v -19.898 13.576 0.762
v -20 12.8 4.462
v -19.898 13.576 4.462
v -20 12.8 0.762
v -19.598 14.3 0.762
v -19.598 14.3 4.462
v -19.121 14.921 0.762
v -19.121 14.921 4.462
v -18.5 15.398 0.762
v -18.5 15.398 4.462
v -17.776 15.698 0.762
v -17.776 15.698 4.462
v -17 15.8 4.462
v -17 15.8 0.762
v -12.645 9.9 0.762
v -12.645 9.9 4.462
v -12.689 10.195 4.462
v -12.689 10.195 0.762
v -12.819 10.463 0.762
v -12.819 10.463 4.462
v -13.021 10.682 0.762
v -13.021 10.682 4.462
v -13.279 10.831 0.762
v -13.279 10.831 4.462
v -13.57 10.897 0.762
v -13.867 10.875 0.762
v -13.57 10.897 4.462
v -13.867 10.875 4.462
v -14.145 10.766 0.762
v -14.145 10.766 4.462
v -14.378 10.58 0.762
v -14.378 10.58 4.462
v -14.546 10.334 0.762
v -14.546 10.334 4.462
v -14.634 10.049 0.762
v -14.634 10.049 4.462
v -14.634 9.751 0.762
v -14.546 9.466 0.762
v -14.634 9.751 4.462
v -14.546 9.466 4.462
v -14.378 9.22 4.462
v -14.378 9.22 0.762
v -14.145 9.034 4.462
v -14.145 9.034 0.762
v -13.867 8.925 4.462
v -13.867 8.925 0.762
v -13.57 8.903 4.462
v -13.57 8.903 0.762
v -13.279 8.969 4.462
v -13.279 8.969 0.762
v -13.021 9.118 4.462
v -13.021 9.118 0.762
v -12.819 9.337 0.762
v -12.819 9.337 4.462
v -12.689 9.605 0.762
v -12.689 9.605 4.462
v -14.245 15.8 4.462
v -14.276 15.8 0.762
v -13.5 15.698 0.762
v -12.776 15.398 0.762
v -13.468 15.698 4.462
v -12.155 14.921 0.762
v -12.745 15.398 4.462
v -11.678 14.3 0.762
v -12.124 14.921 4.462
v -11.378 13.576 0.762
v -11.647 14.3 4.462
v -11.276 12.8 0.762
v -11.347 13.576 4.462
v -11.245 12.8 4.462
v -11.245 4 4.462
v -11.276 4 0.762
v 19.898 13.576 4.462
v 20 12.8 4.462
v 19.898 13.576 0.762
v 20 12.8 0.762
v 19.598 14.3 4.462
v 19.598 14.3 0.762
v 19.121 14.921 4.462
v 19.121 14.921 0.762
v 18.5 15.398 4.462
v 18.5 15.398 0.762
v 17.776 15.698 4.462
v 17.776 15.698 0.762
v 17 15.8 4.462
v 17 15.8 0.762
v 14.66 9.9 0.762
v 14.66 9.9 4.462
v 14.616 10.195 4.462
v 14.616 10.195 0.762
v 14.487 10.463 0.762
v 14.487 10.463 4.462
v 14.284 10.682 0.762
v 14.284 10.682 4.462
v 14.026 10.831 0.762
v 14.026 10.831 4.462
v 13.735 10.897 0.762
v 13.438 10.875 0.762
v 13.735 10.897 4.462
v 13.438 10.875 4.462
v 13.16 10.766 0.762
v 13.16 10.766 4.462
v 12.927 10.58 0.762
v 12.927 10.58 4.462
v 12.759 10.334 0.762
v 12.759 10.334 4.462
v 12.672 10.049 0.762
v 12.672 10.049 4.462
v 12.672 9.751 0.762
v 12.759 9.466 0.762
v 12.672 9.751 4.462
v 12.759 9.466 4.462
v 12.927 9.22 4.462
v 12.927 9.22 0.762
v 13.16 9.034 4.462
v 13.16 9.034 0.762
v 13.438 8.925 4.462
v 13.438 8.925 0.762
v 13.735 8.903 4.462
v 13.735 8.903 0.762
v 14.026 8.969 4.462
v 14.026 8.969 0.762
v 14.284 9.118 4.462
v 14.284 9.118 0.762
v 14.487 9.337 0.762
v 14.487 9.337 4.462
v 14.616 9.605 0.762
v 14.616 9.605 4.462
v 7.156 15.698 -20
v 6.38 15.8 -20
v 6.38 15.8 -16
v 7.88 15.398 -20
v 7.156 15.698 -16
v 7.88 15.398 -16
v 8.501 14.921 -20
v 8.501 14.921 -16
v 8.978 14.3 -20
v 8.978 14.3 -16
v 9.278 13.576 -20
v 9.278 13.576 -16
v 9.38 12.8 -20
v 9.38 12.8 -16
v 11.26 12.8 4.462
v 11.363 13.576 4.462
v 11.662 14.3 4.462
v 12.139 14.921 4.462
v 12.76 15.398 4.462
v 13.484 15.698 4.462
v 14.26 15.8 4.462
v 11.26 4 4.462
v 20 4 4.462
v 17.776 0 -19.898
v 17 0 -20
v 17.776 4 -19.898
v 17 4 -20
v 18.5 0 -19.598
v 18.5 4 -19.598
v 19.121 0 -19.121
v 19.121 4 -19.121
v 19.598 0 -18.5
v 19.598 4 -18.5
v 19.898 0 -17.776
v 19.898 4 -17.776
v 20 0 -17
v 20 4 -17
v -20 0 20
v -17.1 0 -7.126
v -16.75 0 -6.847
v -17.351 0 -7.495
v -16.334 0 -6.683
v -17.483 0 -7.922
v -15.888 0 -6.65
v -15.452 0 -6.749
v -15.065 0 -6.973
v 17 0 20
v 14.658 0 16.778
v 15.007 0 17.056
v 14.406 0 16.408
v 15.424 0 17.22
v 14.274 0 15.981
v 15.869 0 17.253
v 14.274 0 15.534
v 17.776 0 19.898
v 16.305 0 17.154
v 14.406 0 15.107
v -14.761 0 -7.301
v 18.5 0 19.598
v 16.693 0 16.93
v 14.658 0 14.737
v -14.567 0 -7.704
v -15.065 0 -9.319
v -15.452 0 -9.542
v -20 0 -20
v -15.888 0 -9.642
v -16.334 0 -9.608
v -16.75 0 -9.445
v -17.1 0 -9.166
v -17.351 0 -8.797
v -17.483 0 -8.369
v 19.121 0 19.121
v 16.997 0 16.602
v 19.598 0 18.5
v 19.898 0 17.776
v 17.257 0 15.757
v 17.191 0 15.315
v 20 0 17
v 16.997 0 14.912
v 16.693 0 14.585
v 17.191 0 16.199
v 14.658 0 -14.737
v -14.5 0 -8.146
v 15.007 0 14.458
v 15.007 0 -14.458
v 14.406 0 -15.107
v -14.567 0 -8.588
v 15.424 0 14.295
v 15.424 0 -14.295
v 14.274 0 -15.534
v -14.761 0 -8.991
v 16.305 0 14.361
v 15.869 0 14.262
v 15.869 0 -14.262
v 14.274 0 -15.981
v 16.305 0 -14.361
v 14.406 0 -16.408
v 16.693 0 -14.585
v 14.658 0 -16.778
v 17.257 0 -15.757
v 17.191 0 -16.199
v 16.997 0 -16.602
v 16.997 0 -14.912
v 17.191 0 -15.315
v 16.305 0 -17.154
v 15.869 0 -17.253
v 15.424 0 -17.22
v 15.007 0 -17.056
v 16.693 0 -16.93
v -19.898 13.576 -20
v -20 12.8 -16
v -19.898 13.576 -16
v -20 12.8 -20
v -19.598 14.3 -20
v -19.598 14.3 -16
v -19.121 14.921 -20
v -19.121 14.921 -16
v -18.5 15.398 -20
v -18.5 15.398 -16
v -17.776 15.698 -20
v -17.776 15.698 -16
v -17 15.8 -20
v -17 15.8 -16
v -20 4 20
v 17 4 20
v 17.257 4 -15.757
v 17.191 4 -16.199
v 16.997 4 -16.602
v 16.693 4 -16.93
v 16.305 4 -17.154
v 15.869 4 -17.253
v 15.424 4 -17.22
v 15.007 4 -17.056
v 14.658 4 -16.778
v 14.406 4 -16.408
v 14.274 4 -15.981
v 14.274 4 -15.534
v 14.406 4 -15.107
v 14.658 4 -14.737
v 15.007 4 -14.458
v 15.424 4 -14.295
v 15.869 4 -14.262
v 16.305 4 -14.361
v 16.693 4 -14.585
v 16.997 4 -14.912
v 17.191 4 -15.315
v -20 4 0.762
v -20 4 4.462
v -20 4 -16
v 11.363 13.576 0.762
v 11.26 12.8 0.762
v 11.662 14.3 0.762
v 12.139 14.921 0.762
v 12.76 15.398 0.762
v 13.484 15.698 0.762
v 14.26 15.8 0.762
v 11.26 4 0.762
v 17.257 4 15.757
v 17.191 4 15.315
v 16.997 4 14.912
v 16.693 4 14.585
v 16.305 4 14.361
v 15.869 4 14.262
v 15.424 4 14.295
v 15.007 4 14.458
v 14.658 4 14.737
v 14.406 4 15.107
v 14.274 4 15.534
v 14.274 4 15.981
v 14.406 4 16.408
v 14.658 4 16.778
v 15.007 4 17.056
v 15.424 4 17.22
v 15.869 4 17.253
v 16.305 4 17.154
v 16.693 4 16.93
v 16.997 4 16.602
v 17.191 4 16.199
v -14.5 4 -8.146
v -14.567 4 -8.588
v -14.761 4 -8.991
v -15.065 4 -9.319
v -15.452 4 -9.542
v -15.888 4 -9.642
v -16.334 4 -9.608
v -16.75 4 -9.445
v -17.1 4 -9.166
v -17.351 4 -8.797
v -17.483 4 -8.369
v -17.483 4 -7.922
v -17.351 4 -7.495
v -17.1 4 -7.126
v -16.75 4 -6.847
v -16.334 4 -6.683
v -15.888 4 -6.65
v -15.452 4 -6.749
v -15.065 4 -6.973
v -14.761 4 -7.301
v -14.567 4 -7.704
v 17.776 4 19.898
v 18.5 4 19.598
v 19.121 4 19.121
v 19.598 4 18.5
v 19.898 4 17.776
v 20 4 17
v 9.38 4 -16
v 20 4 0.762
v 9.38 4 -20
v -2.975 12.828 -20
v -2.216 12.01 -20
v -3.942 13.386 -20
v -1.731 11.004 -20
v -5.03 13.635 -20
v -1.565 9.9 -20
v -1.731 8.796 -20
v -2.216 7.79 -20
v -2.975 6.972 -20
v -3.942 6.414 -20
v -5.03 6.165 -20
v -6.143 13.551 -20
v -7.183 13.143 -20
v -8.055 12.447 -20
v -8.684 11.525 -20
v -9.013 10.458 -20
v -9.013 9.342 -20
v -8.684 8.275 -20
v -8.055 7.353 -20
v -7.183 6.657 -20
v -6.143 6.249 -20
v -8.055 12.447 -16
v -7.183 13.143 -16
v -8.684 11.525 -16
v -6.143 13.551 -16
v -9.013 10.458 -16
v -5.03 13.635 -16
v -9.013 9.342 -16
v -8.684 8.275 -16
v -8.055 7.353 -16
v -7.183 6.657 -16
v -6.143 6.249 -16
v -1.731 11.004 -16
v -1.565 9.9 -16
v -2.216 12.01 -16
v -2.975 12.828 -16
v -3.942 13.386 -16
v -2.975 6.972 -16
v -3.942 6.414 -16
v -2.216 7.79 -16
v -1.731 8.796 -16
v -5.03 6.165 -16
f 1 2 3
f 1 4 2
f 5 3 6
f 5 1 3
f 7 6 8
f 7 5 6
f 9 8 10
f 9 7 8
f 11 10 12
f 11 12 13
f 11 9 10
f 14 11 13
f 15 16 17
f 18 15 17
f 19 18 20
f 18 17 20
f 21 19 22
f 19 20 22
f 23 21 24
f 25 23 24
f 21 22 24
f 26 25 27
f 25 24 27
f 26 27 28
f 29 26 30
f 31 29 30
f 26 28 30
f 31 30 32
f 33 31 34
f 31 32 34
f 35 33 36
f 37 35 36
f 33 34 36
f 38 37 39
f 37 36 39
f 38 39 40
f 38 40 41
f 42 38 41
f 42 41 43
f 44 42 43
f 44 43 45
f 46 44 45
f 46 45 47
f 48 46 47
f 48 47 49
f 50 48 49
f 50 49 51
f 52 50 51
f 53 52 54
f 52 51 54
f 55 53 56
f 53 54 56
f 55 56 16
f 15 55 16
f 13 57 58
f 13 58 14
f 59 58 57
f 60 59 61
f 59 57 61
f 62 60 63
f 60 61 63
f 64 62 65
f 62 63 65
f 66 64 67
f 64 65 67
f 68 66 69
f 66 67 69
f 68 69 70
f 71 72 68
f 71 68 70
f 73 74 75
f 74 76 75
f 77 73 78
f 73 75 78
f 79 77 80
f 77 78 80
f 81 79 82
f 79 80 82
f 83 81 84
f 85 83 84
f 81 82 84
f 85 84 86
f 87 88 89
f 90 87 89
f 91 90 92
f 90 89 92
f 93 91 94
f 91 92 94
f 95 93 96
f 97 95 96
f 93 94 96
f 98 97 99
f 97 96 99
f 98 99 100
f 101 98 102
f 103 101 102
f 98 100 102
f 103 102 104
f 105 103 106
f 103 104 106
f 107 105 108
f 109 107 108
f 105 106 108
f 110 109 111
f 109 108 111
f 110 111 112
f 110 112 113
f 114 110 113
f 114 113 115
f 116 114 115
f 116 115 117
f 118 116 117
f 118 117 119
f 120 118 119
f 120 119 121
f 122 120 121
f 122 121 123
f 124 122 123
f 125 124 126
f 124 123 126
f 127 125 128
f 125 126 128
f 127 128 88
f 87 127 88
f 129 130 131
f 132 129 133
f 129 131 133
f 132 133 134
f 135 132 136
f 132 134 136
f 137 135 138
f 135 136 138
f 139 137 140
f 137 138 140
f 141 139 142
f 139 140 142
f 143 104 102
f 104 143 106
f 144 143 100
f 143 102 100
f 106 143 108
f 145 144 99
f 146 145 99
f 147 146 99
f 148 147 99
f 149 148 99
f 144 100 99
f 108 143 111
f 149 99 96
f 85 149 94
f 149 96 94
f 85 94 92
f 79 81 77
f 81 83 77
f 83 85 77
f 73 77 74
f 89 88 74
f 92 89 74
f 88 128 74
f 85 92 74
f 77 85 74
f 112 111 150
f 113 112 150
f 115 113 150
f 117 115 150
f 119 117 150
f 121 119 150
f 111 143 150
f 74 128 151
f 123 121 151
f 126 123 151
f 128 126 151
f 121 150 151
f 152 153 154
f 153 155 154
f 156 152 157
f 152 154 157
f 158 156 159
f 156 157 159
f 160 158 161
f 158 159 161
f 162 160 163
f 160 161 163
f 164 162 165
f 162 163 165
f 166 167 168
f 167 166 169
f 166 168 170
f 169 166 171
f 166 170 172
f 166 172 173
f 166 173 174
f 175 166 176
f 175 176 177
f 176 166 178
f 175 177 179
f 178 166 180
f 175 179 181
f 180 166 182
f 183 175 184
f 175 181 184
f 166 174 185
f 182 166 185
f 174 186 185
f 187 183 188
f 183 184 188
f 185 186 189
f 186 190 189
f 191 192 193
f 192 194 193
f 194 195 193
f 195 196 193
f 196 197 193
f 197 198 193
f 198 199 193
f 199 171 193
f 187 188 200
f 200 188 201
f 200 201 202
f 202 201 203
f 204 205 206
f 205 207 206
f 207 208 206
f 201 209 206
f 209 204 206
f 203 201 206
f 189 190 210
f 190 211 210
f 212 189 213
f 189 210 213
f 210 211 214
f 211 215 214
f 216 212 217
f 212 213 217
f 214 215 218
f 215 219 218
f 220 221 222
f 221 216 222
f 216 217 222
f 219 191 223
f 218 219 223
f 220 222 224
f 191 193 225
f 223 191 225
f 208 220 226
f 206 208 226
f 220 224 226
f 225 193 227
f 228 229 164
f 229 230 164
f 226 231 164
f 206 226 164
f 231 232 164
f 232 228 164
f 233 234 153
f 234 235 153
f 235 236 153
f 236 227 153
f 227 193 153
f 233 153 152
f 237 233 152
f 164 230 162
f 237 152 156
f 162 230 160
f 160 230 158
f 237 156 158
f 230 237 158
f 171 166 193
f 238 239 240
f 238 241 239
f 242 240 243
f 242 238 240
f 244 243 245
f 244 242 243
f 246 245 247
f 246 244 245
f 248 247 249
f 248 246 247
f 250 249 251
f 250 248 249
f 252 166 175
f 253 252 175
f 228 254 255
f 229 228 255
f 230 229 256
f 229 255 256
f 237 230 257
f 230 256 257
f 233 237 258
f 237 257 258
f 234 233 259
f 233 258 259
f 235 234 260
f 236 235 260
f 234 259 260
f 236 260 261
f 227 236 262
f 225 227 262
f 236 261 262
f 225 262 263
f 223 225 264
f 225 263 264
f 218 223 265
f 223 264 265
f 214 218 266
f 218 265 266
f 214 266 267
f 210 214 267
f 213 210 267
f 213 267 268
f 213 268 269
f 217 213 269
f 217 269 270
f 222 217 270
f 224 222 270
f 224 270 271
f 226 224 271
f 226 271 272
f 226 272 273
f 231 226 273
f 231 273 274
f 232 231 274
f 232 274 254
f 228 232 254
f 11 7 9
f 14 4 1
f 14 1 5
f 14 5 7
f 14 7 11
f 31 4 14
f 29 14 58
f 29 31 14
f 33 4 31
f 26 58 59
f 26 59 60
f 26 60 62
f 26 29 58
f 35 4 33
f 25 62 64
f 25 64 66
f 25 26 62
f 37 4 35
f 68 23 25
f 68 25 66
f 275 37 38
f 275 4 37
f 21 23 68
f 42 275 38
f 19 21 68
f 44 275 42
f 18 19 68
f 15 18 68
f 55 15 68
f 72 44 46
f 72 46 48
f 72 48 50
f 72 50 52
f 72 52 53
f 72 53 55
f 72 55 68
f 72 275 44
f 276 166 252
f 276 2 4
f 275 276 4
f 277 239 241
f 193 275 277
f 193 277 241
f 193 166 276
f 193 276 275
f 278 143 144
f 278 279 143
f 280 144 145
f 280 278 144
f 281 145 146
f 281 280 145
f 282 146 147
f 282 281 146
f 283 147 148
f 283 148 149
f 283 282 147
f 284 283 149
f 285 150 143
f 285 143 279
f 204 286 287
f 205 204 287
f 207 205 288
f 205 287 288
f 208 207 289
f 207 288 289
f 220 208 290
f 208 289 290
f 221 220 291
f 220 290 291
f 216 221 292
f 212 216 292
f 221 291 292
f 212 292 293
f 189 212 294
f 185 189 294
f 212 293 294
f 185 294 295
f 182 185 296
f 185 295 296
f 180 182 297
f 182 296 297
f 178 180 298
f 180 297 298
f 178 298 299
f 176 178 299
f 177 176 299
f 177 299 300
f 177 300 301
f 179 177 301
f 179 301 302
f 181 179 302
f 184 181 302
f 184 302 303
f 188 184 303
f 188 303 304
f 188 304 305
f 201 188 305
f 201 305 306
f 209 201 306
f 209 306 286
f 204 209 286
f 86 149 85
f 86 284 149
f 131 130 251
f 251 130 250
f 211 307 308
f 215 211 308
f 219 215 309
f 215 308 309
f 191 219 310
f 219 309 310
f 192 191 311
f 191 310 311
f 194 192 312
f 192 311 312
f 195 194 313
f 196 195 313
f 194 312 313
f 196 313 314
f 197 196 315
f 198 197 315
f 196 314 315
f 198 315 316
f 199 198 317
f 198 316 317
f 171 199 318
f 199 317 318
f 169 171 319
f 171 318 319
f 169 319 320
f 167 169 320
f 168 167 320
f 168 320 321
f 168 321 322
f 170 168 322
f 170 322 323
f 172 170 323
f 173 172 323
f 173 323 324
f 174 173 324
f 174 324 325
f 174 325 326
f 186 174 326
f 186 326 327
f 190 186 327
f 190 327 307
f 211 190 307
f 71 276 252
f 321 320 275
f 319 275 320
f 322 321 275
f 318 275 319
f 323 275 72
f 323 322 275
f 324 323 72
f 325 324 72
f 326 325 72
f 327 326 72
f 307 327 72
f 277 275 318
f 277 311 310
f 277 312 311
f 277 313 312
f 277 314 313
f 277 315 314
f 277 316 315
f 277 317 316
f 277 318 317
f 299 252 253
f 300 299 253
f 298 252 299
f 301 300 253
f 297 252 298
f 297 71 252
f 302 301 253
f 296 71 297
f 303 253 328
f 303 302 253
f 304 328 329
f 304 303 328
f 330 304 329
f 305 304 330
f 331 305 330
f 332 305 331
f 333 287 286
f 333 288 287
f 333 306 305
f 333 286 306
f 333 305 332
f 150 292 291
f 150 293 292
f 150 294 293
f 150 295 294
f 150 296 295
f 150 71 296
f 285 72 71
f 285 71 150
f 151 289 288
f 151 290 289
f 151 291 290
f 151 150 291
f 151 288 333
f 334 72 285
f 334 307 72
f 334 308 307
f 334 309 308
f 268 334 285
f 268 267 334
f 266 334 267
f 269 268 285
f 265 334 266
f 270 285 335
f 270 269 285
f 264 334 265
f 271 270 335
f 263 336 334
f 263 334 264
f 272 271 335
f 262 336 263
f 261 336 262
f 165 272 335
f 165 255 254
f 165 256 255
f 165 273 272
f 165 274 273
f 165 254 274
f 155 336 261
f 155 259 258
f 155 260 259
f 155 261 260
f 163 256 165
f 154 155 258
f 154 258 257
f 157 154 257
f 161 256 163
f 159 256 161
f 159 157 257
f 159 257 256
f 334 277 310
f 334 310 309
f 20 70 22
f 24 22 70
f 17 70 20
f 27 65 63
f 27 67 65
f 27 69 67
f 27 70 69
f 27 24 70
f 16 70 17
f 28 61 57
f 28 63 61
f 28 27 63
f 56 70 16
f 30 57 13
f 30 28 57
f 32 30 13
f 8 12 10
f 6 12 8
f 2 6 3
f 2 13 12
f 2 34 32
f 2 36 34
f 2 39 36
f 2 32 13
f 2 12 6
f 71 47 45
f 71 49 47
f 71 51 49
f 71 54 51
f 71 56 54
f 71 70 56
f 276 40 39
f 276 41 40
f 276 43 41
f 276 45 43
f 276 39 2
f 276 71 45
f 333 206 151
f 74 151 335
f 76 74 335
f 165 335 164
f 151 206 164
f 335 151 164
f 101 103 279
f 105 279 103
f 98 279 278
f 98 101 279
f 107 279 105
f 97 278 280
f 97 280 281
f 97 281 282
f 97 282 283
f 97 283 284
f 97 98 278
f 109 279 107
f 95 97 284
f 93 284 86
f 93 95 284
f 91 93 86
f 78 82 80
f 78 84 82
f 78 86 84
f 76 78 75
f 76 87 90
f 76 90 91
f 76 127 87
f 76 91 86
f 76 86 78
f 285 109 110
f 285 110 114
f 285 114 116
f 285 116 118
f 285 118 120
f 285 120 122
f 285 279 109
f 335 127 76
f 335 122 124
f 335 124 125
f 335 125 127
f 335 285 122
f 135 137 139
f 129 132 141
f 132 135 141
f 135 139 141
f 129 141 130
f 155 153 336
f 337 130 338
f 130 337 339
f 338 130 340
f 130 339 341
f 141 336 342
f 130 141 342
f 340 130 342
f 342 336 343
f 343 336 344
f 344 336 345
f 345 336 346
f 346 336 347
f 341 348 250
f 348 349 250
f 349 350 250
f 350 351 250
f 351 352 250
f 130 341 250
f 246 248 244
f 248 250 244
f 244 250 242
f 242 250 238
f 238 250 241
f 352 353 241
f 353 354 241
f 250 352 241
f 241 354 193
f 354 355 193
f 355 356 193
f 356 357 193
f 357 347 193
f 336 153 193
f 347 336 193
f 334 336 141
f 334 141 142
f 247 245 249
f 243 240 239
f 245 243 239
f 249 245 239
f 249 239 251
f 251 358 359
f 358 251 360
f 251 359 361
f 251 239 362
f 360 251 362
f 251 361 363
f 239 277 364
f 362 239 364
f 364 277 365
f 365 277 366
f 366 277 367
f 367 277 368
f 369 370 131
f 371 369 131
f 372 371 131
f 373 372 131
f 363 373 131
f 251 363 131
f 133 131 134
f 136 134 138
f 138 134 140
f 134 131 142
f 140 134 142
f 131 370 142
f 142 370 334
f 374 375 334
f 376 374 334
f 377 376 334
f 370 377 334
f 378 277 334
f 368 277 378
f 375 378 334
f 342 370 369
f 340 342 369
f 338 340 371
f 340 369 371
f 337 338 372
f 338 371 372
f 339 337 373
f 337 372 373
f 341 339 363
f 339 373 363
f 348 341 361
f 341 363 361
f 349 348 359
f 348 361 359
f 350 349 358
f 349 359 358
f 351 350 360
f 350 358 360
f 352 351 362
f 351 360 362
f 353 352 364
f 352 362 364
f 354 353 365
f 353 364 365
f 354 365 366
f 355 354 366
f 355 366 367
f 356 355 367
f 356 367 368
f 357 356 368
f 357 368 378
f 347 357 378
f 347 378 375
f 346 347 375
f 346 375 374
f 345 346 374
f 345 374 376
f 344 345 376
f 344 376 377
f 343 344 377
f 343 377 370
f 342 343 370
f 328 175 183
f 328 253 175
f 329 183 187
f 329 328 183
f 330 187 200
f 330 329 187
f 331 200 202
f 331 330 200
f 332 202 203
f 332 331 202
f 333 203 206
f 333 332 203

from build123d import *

# Parameters (mm, degrees)
SKETCH1_W           = 40
SKETCH1_H           = 40
BOSS_EXTRUDE1_DEPTH = 4
SKETCH2_W           = 8.739547094
SKETCH2_H           = 3.7
BOSS_EXTRUDE2_DEPTH = 11.8
BOSS_EXTRUDE3_DEPTH = 11.8
SKETCH4_R           = 3.745
CUT_EXTRUDE1_DEPTH  = 5
SKETCH5_R           = 1
CUT_EXTRUDE2_DEPTH  = 3.7
SKETCH6_R           = 1.5
CUT_EXTRUDE3_DEPTH  = 5
FILLET1_R           = 3
FILLET2_R           = 3


with BuildPart() as part:
    # Sketch1 → Boss-Extrude1 (new body)
    with BuildSketch(Plane(origin=(0, 0, 0), x_dir=(1, 0, 0), z_dir=(0, 1, 0))):
        Rectangle(SKETCH1_W, SKETCH1_H)
    extrude(amount=BOSS_EXTRUDE1_DEPTH)

    # Sketch2 → Boss-Extrude2 (add)
    with BuildSketch(Plane(origin=(0, 4, 0), x_dir=(1, 0, 0), z_dir=(0, 1, 0))):
        Polygon((-20, -0.761716699), (-11.276069587, -0.761716699), (-11.244836225, -4.461716699), (-20, -4.461716699), align=None)
        with Locations((15.630226453, -2.611716699)):
            Rectangle(SKETCH2_W, SKETCH2_H)
    extrude(amount=BOSS_EXTRUDE2_DEPTH)

    # Sketch3 → Boss-Extrude3 (add)
    with BuildSketch(Plane(origin=(0, 4, 0), x_dir=(1, 0, 0), z_dir=(0, 1, 0))):
        Polygon((9.38, 16), (-5.31, 16), (-20, 16), (-20, 20), (-5.31, 20), (9.38, 20), align=None)
    extrude(amount=BOSS_EXTRUDE3_DEPTH)

    # Sketch4 → Cut-Extrude1 (cut, through all)
    with BuildSketch(Plane.XY.offset(-16)):
        with Locations((-5.31, 9.9)):
            Circle(SKETCH4_R)
    extrude(amount=-CUT_EXTRUDE1_DEPTH, mode=Mode.SUBTRACT)

    # Sketch5 → Cut-Extrude2 (cut)
    with BuildSketch(Plane.XY.offset(4.461716699)):
        with Locations((-13.644836225, 9.9)):
            Circle(SKETCH5_R)
        with Locations((13.660452906, 9.9)):
            Circle(SKETCH5_R)
    extrude(amount=-CUT_EXTRUDE2_DEPTH, mode=Mode.SUBTRACT)

    # Sketch6 → Cut-Extrude3 (cut, through all)
    with BuildSketch(Plane(origin=(0, 4, 0), x_dir=(1, 0, 0), z_dir=(0, 1, 0))):
        with Locations((15.757359313, 15.757359313)):
            Circle(SKETCH6_R)
        with Locations((15.757359313, -15.757359313)):
            Circle(SKETCH6_R)
        with Locations((-16, 8.145789662)):
            Circle(SKETCH6_R)
    extrude(amount=-CUT_EXTRUDE3_DEPTH, mode=Mode.SUBTRACT)

    # Fillet1
    fillet1_edges = [part.edges().sort_by_distance(p)[0] for p in [
        (-11.260452906, 15.8, 2.611716699),
        (-20, 15.8, 2.611716699),
        (20, 15.8, 2.611716699),
        (11.260452906, 15.8, 2.611716699),
        (9.38, 15.8, -18),
        (-20, 15.8, -18),
    ]]
    fillet(fillet1_edges, radius=FILLET1_R)

    # Fillet2
    fillet2_edges = [part.edges().sort_by_distance(p)[0] for p in [
        (20, 2, 20),
        (20, 2, -20),
    ]]
    fillet(fillet2_edges, radius=FILLET2_R)


solid = part.part
